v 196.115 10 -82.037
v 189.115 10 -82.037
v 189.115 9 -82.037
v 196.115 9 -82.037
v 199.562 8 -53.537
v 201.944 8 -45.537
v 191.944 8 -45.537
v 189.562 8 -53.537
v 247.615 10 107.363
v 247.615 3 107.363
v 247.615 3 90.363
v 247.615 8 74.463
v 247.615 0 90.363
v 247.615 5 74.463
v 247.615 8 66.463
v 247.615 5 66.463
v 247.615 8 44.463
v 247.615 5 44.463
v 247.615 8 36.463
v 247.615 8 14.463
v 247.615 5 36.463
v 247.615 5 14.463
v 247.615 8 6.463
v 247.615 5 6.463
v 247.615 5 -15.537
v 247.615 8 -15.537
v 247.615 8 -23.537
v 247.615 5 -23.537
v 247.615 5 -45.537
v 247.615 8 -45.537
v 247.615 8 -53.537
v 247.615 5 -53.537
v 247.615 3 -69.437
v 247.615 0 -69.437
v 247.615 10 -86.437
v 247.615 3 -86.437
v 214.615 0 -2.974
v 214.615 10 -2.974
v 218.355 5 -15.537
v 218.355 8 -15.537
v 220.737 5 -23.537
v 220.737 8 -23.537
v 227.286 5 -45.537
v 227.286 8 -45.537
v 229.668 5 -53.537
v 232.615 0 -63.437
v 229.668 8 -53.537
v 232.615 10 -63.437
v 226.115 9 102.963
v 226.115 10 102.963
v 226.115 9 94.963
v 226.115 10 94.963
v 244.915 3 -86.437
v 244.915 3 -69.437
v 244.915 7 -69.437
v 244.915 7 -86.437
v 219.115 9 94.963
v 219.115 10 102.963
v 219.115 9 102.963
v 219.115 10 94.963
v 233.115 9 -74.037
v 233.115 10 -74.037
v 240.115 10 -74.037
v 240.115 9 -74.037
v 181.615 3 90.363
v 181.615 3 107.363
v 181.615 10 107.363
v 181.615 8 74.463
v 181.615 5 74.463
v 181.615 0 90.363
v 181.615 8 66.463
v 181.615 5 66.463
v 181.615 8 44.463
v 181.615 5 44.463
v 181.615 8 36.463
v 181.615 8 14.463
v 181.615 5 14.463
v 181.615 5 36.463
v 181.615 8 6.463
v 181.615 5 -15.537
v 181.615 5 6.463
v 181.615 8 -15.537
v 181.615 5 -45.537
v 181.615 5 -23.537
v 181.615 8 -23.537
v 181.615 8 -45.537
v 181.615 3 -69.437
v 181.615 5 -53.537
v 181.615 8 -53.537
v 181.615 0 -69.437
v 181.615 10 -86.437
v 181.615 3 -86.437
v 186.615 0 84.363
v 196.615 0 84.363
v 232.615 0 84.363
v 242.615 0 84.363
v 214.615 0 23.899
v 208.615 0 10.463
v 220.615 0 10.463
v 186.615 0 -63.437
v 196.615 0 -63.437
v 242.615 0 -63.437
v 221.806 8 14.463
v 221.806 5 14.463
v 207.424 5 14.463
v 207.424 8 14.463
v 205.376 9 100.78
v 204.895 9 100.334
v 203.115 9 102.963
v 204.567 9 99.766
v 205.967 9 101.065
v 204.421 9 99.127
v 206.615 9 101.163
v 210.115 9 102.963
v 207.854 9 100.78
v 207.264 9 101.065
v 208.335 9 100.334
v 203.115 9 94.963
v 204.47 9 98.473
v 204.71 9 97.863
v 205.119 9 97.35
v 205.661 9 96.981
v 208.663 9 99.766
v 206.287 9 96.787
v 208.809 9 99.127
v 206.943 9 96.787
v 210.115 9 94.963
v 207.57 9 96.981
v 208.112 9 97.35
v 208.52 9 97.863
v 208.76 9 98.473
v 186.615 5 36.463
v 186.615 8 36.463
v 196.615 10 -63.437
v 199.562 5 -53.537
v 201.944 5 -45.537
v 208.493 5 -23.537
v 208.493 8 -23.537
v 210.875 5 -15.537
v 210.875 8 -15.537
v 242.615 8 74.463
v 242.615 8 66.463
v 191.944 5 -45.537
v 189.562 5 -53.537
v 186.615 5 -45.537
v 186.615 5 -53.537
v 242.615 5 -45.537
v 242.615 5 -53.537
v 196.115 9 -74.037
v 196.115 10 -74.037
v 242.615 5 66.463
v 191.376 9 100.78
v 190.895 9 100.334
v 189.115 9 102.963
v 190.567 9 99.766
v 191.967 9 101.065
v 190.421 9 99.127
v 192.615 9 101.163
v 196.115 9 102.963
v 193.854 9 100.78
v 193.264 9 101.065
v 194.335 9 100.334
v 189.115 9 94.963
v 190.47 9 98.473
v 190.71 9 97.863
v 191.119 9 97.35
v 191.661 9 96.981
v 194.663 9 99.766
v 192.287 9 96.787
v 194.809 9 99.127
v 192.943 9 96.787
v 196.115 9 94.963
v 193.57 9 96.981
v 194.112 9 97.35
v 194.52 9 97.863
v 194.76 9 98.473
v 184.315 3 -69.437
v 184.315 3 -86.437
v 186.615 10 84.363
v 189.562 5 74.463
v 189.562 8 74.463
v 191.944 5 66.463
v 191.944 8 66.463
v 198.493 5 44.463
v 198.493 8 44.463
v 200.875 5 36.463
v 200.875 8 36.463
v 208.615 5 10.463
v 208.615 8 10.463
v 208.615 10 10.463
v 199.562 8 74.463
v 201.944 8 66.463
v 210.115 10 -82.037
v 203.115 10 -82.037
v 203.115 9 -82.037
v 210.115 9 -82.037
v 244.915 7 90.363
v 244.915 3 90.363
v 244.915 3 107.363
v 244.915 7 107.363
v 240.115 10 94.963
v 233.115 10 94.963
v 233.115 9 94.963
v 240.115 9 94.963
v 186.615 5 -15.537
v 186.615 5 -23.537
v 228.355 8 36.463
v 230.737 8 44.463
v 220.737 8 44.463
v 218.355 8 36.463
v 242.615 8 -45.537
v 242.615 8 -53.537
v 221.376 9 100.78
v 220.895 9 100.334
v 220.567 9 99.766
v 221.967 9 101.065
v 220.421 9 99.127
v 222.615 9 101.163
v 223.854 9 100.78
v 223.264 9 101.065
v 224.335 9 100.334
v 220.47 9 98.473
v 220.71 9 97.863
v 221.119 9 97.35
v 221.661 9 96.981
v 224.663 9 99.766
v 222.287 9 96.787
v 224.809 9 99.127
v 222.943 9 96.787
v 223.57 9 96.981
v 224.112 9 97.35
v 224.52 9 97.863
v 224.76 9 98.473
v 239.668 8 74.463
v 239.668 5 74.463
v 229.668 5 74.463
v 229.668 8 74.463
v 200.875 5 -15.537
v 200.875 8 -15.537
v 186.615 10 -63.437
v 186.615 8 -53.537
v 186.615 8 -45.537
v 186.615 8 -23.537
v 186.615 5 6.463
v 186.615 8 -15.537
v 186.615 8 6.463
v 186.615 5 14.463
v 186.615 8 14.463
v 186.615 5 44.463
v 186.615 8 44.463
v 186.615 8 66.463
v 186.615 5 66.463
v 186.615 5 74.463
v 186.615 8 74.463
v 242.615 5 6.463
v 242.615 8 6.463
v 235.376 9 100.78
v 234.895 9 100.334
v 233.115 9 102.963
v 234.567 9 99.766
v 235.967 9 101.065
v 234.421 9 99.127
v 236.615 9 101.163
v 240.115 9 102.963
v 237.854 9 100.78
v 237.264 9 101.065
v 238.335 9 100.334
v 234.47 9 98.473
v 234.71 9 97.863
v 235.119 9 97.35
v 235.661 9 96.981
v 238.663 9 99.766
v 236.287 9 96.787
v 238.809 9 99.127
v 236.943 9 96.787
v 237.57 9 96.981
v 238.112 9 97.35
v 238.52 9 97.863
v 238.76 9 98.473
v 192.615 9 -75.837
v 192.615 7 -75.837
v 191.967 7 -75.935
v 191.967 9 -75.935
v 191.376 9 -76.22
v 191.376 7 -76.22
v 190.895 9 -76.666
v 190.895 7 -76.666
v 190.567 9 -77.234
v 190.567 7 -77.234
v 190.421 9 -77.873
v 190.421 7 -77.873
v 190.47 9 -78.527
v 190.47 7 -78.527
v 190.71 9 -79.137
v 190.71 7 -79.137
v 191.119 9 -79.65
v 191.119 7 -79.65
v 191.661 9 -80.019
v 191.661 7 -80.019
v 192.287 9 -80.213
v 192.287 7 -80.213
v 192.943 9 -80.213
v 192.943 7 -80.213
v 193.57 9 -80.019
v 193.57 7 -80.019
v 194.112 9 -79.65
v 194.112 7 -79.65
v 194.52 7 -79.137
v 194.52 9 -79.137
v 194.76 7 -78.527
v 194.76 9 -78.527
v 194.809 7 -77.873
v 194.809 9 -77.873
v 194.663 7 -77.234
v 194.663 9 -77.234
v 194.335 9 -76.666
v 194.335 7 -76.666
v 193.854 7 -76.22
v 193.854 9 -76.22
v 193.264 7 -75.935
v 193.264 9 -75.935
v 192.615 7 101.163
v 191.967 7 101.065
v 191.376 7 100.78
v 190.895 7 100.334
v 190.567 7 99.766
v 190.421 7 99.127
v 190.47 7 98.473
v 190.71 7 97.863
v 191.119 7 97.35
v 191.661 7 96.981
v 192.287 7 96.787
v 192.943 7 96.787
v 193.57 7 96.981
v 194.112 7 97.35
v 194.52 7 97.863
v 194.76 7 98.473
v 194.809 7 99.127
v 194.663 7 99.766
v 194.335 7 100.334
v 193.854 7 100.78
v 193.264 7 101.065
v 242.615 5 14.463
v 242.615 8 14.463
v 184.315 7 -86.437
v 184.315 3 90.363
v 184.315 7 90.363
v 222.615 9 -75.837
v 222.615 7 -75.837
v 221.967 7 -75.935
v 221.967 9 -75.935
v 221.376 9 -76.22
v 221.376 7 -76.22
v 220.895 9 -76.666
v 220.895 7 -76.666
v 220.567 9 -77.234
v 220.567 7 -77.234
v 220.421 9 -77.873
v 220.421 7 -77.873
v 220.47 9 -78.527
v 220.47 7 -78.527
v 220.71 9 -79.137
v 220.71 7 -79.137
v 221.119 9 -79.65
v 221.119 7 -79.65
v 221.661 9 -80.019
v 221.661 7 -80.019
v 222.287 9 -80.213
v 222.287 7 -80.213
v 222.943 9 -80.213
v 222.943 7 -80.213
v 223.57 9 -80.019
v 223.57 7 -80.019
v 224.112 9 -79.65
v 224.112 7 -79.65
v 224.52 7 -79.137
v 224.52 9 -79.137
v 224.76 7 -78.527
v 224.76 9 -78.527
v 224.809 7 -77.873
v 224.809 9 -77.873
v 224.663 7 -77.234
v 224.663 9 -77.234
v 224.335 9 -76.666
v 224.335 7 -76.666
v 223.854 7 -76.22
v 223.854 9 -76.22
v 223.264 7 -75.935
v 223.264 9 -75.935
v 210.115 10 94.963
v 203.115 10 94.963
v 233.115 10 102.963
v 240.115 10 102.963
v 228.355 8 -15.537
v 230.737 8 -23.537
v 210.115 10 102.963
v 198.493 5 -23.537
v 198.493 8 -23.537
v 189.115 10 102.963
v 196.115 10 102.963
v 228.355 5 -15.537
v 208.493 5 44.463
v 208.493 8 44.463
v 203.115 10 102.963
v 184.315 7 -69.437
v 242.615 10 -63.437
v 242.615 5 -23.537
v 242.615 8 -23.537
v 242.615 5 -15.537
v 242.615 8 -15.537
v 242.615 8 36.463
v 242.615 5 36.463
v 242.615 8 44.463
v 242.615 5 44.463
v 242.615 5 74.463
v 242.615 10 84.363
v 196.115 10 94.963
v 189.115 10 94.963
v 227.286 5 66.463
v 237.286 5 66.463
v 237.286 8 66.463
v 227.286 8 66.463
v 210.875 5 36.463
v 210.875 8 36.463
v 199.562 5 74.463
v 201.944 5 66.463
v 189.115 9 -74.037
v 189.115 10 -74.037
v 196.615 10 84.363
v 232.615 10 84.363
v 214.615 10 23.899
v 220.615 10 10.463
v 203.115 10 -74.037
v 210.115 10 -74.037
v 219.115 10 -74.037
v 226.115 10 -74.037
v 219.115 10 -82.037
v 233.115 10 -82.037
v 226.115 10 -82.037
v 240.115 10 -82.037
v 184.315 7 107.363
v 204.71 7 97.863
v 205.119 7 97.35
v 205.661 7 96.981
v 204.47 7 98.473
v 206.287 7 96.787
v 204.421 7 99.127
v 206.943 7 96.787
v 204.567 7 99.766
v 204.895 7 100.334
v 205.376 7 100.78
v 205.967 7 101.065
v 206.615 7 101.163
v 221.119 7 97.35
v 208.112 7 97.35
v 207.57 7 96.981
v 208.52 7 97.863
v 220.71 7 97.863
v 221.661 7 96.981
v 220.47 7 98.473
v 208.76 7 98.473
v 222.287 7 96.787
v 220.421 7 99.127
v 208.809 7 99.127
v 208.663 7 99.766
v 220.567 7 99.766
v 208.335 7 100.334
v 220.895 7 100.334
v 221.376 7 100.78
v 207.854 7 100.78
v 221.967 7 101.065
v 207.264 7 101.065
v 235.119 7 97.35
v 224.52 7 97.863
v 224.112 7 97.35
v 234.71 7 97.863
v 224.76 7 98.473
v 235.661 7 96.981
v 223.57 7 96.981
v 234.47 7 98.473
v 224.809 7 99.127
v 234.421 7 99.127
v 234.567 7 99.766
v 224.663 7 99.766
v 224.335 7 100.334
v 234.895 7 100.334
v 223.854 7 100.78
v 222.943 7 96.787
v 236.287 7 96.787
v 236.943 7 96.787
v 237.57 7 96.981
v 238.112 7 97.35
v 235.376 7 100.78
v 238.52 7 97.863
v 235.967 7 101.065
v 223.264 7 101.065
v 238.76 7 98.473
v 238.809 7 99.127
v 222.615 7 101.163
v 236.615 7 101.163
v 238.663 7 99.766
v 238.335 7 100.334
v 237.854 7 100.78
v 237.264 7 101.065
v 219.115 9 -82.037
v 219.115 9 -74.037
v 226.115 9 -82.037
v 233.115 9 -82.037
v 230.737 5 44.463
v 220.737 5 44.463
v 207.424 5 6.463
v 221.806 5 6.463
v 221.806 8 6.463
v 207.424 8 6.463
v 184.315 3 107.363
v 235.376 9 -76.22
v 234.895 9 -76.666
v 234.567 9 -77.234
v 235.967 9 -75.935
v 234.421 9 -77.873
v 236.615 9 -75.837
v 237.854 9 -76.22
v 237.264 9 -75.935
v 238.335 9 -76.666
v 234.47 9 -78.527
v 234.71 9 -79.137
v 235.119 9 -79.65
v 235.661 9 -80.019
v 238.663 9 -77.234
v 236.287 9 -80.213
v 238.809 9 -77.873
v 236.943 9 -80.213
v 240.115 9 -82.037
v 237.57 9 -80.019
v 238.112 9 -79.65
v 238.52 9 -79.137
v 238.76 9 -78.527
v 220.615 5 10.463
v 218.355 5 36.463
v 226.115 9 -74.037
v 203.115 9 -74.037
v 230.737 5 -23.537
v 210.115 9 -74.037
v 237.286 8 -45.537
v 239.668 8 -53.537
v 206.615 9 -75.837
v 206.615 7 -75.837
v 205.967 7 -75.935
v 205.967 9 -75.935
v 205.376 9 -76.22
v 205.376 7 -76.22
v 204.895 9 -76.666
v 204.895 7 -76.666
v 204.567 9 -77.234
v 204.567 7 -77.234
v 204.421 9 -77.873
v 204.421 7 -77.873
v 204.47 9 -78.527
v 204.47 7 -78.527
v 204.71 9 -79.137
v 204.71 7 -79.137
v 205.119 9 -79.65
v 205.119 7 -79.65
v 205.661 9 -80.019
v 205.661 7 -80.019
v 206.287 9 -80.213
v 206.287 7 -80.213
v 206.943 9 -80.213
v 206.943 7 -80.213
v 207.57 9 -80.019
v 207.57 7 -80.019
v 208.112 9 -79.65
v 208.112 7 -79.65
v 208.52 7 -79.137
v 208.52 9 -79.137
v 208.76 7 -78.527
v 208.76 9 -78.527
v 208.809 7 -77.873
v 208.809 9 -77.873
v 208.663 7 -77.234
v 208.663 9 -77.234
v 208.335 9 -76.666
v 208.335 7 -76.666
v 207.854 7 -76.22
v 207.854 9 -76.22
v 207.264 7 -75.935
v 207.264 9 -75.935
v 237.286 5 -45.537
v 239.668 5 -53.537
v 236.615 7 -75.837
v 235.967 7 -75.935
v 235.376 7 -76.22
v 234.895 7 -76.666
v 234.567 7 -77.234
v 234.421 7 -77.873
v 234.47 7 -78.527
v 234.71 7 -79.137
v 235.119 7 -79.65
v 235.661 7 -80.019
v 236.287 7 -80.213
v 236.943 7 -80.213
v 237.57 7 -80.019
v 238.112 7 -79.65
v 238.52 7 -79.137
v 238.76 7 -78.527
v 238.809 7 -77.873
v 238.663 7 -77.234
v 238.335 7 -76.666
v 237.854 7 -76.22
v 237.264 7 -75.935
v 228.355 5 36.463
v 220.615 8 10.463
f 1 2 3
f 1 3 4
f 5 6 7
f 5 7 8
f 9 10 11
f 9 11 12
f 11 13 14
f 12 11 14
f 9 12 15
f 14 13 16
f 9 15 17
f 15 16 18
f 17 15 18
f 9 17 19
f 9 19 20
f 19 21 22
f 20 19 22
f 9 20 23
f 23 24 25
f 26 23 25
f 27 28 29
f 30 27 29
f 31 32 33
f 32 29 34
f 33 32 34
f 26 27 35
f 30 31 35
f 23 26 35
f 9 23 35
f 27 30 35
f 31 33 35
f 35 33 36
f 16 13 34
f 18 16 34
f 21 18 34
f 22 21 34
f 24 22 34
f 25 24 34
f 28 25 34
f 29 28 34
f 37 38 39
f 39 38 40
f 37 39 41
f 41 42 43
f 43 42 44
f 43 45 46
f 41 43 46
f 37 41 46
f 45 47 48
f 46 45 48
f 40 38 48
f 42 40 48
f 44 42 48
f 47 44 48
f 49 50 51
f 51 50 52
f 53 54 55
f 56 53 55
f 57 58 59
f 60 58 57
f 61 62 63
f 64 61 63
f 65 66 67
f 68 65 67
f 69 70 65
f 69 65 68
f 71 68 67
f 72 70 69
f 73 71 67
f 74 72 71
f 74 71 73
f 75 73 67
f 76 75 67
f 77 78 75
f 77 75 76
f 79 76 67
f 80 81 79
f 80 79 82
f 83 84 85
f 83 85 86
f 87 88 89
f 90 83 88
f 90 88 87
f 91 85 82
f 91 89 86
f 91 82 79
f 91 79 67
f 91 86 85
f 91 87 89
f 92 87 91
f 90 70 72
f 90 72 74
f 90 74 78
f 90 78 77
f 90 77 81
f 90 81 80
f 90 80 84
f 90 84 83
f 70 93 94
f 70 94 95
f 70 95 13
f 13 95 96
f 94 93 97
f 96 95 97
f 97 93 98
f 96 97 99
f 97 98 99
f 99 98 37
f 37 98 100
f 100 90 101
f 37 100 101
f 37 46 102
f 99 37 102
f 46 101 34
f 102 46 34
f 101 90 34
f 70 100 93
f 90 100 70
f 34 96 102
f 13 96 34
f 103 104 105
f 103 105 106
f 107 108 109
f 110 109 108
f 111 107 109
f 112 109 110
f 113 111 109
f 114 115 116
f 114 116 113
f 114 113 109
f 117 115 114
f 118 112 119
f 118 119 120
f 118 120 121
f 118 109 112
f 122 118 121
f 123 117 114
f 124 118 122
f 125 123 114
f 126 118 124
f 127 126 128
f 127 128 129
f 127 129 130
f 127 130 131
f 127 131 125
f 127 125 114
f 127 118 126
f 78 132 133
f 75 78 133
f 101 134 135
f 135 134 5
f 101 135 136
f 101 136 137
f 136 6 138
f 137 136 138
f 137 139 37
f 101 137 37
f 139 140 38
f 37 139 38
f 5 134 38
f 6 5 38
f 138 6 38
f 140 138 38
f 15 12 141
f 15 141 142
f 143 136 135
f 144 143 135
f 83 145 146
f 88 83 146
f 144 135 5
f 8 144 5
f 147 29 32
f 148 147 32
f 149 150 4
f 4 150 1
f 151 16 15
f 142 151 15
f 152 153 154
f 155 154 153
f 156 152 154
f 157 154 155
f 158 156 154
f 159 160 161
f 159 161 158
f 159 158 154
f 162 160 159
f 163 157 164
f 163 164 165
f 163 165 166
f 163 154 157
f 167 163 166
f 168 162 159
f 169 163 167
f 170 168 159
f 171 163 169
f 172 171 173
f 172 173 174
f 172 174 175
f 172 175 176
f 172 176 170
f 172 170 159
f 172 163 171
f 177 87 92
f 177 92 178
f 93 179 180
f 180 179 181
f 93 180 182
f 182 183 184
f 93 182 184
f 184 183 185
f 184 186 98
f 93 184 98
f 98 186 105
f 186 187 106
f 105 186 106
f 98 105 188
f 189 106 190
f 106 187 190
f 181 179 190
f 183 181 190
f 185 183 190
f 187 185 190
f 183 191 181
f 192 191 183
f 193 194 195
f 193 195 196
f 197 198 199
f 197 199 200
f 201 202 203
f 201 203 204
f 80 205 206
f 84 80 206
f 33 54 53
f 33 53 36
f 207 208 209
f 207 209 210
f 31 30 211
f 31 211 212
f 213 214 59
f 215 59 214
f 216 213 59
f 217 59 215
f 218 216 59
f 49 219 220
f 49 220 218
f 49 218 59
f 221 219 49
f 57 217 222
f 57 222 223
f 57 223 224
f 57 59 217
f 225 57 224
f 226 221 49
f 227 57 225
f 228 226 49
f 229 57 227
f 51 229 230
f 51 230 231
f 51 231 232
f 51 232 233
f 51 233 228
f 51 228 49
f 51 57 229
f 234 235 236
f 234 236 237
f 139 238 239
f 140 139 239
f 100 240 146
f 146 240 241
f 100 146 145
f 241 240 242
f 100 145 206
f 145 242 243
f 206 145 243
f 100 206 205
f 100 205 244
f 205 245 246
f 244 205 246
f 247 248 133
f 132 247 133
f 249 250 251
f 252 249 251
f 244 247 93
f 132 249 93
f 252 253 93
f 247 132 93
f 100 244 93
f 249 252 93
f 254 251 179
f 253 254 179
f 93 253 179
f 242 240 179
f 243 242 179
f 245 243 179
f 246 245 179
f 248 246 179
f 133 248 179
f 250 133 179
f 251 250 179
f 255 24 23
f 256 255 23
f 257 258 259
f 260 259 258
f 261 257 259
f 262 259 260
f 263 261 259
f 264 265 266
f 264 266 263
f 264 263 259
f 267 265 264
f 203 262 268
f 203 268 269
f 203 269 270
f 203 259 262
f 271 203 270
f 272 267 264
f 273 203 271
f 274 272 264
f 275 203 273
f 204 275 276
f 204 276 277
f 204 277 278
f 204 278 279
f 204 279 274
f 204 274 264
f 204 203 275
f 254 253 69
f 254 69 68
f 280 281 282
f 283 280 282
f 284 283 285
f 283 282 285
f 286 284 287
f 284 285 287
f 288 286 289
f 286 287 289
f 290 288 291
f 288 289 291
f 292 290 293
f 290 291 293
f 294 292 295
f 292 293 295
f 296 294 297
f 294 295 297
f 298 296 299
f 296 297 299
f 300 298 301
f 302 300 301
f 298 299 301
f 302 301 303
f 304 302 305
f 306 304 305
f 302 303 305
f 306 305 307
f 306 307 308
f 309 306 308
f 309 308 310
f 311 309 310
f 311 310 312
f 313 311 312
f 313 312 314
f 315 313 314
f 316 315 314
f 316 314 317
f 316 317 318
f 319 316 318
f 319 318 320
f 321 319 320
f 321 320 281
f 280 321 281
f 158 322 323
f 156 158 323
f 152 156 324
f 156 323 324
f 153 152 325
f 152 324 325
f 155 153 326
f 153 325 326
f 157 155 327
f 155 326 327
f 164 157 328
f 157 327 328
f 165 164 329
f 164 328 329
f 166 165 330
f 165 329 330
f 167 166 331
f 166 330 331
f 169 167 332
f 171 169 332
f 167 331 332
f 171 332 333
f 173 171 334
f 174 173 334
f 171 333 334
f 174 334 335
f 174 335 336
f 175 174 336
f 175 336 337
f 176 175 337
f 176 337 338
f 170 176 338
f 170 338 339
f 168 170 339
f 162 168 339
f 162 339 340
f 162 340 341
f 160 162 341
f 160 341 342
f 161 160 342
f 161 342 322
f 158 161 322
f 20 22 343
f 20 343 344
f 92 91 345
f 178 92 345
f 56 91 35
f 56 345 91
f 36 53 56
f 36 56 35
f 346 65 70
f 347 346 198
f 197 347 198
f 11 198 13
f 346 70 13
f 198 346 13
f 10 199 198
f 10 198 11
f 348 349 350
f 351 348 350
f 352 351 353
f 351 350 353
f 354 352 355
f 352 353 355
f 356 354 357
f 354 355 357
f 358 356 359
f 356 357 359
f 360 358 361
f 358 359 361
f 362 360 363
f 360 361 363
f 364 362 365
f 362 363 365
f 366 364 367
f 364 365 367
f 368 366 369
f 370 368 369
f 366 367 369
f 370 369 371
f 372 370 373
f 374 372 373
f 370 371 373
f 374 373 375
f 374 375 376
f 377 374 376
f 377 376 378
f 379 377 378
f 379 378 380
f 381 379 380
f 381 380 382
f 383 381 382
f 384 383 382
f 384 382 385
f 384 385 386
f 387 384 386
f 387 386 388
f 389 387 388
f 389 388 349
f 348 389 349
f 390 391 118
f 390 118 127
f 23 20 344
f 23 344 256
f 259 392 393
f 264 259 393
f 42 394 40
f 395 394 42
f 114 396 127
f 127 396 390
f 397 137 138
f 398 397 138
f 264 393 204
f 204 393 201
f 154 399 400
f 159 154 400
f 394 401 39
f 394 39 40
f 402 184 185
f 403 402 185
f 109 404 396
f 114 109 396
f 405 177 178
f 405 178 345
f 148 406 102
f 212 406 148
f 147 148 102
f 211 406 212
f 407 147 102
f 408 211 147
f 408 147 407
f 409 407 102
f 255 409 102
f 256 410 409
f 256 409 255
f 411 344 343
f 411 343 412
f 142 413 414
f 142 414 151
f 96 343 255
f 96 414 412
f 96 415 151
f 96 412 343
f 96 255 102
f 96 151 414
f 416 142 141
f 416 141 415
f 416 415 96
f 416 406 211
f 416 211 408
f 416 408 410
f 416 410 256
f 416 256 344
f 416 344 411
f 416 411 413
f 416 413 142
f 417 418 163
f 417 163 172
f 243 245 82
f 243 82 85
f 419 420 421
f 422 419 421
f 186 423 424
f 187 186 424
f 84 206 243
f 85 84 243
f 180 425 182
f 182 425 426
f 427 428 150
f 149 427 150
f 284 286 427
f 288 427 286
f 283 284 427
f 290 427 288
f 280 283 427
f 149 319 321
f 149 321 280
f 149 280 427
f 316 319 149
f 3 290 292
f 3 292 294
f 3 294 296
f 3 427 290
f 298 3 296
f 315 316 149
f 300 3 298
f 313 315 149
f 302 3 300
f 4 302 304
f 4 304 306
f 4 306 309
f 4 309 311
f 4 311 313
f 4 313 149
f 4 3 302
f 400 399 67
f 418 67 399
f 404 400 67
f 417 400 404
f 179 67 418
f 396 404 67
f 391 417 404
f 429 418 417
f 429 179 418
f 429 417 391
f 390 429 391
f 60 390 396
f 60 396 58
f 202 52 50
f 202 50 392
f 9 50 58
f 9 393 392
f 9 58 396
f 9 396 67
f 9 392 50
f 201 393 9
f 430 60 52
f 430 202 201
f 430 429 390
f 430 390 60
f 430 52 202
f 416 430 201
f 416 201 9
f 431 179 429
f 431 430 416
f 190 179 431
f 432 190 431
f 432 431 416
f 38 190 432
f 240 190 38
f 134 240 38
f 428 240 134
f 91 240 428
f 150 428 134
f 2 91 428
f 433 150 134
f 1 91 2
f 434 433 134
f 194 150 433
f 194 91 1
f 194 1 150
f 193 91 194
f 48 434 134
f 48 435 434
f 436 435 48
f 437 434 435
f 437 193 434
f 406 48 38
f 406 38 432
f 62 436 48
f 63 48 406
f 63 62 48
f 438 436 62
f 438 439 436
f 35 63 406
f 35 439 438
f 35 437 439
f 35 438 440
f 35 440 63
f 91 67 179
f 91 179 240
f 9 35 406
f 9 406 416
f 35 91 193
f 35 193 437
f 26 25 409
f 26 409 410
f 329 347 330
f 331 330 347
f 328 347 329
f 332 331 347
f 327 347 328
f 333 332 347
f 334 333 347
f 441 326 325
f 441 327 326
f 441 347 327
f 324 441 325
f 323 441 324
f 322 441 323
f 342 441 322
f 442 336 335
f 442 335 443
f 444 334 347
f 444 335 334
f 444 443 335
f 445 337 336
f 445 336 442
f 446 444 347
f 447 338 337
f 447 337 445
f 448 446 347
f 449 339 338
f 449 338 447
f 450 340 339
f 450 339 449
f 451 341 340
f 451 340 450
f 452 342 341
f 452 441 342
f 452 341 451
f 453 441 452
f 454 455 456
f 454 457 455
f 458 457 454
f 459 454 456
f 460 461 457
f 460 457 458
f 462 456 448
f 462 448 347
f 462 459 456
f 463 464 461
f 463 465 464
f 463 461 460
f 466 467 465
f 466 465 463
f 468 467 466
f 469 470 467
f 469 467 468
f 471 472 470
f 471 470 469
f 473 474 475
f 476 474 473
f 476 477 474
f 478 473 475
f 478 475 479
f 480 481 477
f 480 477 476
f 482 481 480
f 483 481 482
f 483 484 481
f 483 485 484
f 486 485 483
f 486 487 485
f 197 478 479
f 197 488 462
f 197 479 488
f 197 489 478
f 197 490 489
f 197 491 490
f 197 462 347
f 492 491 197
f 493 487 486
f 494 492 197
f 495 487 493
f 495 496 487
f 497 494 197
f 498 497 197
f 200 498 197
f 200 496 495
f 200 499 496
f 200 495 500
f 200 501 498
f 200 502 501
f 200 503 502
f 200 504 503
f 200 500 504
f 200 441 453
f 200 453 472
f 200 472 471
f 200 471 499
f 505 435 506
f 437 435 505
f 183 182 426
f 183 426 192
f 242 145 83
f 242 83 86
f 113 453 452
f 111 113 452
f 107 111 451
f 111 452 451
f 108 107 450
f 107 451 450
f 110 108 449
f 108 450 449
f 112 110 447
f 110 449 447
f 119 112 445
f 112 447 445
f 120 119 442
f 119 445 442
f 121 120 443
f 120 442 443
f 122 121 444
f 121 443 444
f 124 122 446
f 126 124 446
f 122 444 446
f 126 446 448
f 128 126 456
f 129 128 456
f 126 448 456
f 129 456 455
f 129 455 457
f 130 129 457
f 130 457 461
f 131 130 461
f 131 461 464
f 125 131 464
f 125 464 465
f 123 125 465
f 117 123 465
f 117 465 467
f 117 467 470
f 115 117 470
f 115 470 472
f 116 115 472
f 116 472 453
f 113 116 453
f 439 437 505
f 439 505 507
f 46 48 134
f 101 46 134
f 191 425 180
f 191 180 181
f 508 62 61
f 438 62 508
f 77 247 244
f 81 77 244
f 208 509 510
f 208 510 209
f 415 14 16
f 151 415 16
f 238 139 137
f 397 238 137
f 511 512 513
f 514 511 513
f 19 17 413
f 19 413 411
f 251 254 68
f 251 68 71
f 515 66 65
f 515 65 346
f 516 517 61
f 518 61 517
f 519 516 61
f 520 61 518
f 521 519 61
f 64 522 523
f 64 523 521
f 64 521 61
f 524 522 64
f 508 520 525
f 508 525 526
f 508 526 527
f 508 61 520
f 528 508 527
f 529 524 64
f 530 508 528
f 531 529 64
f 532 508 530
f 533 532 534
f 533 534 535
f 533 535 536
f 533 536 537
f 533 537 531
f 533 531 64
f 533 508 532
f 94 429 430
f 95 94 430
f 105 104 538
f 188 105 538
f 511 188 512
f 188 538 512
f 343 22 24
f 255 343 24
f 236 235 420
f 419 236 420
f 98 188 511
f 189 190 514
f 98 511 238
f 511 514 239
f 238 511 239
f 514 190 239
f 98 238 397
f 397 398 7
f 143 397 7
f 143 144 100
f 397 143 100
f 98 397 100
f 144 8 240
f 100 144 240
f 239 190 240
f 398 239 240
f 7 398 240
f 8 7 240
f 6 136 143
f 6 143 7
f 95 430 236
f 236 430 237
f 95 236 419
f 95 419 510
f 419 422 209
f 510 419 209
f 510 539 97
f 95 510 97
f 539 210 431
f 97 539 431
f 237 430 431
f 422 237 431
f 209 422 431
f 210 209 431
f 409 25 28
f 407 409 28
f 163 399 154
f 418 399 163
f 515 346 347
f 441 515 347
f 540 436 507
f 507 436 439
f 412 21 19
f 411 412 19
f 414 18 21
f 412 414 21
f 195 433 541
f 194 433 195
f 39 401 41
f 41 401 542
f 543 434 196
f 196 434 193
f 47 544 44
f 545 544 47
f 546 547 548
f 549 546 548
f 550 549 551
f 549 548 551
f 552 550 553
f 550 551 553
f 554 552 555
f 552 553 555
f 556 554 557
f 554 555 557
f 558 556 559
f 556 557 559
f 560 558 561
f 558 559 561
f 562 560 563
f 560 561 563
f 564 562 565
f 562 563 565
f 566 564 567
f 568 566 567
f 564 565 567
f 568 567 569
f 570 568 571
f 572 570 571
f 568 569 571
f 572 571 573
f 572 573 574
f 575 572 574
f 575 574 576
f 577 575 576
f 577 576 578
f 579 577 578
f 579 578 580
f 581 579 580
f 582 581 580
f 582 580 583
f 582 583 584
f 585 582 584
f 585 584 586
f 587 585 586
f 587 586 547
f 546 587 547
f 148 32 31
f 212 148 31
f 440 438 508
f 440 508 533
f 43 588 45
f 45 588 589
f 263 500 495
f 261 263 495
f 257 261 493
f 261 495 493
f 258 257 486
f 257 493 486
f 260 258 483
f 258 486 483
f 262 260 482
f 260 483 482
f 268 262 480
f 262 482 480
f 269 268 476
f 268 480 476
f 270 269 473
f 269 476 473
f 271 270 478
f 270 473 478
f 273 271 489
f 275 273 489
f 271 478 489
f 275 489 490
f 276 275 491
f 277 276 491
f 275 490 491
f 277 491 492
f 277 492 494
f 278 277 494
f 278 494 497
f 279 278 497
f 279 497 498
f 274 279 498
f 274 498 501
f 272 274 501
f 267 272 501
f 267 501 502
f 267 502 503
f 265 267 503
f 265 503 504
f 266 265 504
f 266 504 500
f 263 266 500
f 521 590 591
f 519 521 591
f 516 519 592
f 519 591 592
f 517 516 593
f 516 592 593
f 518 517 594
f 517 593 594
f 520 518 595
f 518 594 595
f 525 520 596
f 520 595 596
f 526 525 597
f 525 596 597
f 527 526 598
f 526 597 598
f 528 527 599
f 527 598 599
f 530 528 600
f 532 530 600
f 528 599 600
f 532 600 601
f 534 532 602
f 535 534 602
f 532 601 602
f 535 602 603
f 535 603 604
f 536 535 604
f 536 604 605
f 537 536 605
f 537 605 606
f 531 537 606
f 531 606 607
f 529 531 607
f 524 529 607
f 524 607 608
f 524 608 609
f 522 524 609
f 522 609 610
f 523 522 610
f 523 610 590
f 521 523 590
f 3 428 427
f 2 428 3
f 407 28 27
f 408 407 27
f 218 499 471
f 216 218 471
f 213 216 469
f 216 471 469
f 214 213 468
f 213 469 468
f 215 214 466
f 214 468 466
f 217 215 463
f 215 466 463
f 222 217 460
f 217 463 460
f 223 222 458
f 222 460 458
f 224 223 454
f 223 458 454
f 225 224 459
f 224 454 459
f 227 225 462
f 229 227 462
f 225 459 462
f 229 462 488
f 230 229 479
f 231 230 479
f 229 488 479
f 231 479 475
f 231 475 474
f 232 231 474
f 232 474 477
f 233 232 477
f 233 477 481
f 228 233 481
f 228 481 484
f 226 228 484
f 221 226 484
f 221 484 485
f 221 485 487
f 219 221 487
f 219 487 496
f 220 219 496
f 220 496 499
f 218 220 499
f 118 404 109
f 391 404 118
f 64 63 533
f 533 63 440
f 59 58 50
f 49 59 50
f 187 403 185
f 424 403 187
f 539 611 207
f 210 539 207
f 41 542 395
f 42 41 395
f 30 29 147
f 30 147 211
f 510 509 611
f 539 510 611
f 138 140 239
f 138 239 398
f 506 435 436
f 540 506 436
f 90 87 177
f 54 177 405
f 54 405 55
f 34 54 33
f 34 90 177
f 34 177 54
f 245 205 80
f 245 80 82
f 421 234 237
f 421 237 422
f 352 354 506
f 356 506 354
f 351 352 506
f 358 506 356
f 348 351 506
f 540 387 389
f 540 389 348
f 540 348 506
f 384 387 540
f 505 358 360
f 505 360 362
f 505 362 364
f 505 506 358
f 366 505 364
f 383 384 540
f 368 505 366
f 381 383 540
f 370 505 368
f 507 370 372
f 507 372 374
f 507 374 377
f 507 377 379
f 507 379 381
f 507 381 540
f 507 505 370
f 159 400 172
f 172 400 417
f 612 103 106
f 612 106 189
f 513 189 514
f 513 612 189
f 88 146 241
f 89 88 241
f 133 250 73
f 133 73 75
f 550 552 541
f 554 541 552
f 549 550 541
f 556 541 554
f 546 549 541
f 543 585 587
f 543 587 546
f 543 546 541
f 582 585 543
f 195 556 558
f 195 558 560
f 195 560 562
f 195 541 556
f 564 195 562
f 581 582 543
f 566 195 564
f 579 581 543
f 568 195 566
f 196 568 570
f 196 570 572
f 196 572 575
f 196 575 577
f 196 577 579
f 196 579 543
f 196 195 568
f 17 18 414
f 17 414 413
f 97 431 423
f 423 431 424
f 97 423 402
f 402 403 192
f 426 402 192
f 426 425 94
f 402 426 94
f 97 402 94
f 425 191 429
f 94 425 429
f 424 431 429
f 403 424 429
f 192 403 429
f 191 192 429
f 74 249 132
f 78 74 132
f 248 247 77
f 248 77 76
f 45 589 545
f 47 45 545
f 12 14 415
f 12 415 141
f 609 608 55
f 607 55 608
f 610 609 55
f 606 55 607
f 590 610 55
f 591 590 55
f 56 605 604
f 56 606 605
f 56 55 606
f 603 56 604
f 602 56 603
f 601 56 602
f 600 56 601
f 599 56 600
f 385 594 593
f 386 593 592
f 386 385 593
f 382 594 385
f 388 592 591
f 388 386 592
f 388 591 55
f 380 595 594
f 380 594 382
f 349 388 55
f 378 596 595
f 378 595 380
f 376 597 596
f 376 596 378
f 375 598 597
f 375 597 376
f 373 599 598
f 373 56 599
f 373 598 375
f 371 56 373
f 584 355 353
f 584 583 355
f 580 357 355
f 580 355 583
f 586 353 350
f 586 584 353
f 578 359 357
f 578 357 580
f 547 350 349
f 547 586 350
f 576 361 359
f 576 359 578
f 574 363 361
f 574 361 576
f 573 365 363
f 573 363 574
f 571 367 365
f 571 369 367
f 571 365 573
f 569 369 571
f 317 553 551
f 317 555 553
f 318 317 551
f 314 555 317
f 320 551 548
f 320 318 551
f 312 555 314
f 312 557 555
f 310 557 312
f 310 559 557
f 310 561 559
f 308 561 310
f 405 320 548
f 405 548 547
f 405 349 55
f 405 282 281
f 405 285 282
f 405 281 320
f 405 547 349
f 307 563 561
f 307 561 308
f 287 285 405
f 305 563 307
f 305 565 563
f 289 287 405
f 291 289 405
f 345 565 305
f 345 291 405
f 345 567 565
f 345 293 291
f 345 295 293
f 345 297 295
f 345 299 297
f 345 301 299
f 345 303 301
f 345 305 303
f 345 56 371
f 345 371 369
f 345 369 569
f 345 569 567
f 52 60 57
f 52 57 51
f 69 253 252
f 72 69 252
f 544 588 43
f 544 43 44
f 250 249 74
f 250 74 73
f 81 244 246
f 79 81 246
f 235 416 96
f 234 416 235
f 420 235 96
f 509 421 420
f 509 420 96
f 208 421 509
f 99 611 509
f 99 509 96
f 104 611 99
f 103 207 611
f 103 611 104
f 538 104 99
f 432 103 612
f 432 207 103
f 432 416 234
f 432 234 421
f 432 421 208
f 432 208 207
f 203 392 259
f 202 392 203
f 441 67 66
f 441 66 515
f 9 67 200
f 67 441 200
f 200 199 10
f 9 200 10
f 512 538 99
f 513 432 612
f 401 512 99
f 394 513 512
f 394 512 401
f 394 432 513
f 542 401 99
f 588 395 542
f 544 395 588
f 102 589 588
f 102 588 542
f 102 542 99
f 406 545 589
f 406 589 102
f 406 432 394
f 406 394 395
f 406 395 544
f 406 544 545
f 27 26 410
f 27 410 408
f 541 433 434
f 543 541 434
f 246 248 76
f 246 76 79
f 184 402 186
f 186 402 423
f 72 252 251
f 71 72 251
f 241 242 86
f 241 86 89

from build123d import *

# Parameters (mm, degrees)
SKETCH1_W           = 66
SKETCH1_H           = 193.8
BOSS_EXTRUDE1_DEPTH = 10
SKETCH2_W           = 66
SKETCH2_H           = 17
CUT_EXTRUDE1_DEPTH  = 3
SKETCH3_W           = 66
SKETCH3_H           = 17
CUT_EXTRUDE2_DEPTH  = 3
SKETCH4_W           = 60.6
SKETCH4_H           = 4
CUT_EXTRUDE3_DEPTH  = 17
SKETCH5_W           = 60.6
SKETCH5_H           = 4
CUT_EXTRUDE4_DEPTH  = 17
SKETCH6_R           = 2.2
CUT_EXTRUDE5_DEPTH  = 10
SKETCH7_W           = 7
SKETCH7_H           = 8
CUT_EXTRUDE6_DEPTH  = 1
CUT_EXTRUDE7_DEPTH  = 271.07407236
SKETCH9_W           = 8
SKETCH9_H           = 3
CUT_EXTRUDE8_DEPTH  = 127.422870419


with BuildPart() as part:
    # Sketch1 → Boss-Extrude1 (new body)
    with BuildSketch(Plane(origin=(0, 0, 0), x_dir=(1, 0, 0), z_dir=(0, 1, 0))):
        with Locations((214.615149771, -10.462666532)):
            Rectangle(SKETCH1_W, SKETCH1_H)
    extrude(amount=BOSS_EXTRUDE1_DEPTH)

    # Sketch2 → Cut-Extrude1 (cut)
    with BuildSketch(Plane.XZ):
        with Locations((214.615149771, -77.937333468)):
            Rectangle(SKETCH2_W, SKETCH2_H)
    extrude(amount=-CUT_EXTRUDE1_DEPTH, mode=Mode.SUBTRACT)

    # Sketch3 → Cut-Extrude2 (cut)
    with BuildSketch(Plane.XZ):
        with Locations((214.615149771, 98.862666532)):
            Rectangle(SKETCH3_W, SKETCH3_H)
    extrude(amount=-CUT_EXTRUDE2_DEPTH, mode=Mode.SUBTRACT)

    # Sketch4 → Cut-Extrude3 (cut)
    with BuildSketch(Plane(origin=(0, 0, -86.437333468), x_dir=(-1, 0, 0), z_dir=(0, 0, -1))):
        with Locations((-214.615149771, 5)):
            Rectangle(SKETCH4_W, SKETCH4_H)
    extrude(amount=-CUT_EXTRUDE3_DEPTH, mode=Mode.SUBTRACT)

    # Sketch5 → Cut-Extrude4 (cut)
    with BuildSketch(Plane.XY.offset(107.362666532)):
        with Locations((214.615149771, 5)):
            Rectangle(SKETCH5_W, SKETCH5_H)
    extrude(amount=-CUT_EXTRUDE4_DEPTH, mode=Mode.SUBTRACT)

    # Sketch6 → Cut-Extrude5 (cut)
    with BuildSketch(Plane.XZ):
        with Locations(Location((236.615149771, 98.962666532, 0), (0, 0, 90))):
            Circle(SKETCH6_R)
        with Locations(Location((222.615149771, 98.962666532, 0), (0, 0, 90))):
            Circle(SKETCH6_R)
        with Locations(Location((206.615149771, 98.962666532, 0), (0, 0, 90))):
            Circle(SKETCH6_R)
        with Locations(Location((192.615149771, 98.962666532, 0), (0, 0, 90))):
            Circle(SKETCH6_R)
        with Locations(Location((236.615149771, -78.037333468, 0), (0, 0, 90))):
            Circle(SKETCH6_R)
        with Locations(Location((222.615149771, -78.037333468, 0), (0, 0, 90))):
            Circle(SKETCH6_R)
        with Locations(Location((206.615149771, -78.037333468, 0), (0, 0, 90))):
            Circle(SKETCH6_R)
        with Locations(Location((192.615149771, -78.037333468, 0), (0, 0, 90))):
            Circle(SKETCH6_R)
    extrude(amount=-CUT_EXTRUDE5_DEPTH, mode=Mode.SUBTRACT)

    # Sketch7 → Cut-Extrude6 (cut)
    with BuildSketch(Plane(origin=(0, 10, 0), x_dir=(1, 0, 0), z_dir=(0, 1, 0))):
        with Locations((192.615149771, 78.037333468)):
            Rectangle(SKETCH7_W, SKETCH7_H)
        with Locations((206.615149771, 78.037333468)):
            Rectangle(SKETCH7_W, SKETCH7_H)
        with Locations((222.615149771, 78.037333468)):
            Rectangle(SKETCH7_W, SKETCH7_H)
        with Locations((236.615149771, 78.037333468)):
            Rectangle(SKETCH7_W, SKETCH7_H)
        with Locations((236.615149771, -98.962666532)):
            Rectangle(SKETCH7_W, SKETCH7_H)
        with Locations((222.615149771, -98.962666532)):
            Rectangle(SKETCH7_W, SKETCH7_H)
        with Locations((206.615149771, -98.962666532)):
            Rectangle(SKETCH7_W, SKETCH7_H)
        with Locations((192.615149771, -98.962666532)):
            Rectangle(SKETCH7_W, SKETCH7_H)
    extrude(amount=-CUT_EXTRUDE6_DEPTH, mode=Mode.SUBTRACT)

    # Sketch8 → Cut-Extrude7 (cut, through all)
    with BuildSketch(Plane(origin=(0, 10, 0), x_dir=(1, 0, 0), z_dir=(0, 1, 0))):
        Polygon((186.615149771, 63.437333468), (186.615149771, -84.362666532), (208.615149771, -10.462666532), align=None)
        Polygon((196.615149771, 63.437333468), (214.615149771, 2.973697104), (232.615149771, 63.437333468), align=None)
        Polygon((214.615149771, -23.899030169), (196.615149771, -84.362666532), (232.615149771, -84.362666532), align=None)
        Polygon((242.615149771, 63.437333468), (242.615149771, -84.362666532), (220.615149771, -10.462666532), align=None)
    extrude(amount=-CUT_EXTRUDE7_DEPTH, mode=Mode.SUBTRACT)

    # Sketch9 → Cut-Extrude8 (cut, through all)
    with BuildSketch(Plane(origin=(247.615149771, 0, 0), x_dir=(0, 0, -1), z_dir=(1, 0, 0))):
        with Locations((-70.462666532, 6.5)):
            Rectangle(SKETCH9_W, SKETCH9_H)
        with Locations((-40.462666532, 6.5)):
            Rectangle(SKETCH9_W, SKETCH9_H)
        with Locations((-10.462666532, 6.5)):
            Rectangle(SKETCH9_W, SKETCH9_H)
        with Locations((19.537333468, 6.5)):
            Rectangle(SKETCH9_W, SKETCH9_H)
        with Locations((49.537333468, 6.5)):
            Rectangle(SKETCH9_W, SKETCH9_H)
    extrude(amount=-CUT_EXTRUDE8_DEPTH, mode=Mode.SUBTRACT)


solid = part.part
